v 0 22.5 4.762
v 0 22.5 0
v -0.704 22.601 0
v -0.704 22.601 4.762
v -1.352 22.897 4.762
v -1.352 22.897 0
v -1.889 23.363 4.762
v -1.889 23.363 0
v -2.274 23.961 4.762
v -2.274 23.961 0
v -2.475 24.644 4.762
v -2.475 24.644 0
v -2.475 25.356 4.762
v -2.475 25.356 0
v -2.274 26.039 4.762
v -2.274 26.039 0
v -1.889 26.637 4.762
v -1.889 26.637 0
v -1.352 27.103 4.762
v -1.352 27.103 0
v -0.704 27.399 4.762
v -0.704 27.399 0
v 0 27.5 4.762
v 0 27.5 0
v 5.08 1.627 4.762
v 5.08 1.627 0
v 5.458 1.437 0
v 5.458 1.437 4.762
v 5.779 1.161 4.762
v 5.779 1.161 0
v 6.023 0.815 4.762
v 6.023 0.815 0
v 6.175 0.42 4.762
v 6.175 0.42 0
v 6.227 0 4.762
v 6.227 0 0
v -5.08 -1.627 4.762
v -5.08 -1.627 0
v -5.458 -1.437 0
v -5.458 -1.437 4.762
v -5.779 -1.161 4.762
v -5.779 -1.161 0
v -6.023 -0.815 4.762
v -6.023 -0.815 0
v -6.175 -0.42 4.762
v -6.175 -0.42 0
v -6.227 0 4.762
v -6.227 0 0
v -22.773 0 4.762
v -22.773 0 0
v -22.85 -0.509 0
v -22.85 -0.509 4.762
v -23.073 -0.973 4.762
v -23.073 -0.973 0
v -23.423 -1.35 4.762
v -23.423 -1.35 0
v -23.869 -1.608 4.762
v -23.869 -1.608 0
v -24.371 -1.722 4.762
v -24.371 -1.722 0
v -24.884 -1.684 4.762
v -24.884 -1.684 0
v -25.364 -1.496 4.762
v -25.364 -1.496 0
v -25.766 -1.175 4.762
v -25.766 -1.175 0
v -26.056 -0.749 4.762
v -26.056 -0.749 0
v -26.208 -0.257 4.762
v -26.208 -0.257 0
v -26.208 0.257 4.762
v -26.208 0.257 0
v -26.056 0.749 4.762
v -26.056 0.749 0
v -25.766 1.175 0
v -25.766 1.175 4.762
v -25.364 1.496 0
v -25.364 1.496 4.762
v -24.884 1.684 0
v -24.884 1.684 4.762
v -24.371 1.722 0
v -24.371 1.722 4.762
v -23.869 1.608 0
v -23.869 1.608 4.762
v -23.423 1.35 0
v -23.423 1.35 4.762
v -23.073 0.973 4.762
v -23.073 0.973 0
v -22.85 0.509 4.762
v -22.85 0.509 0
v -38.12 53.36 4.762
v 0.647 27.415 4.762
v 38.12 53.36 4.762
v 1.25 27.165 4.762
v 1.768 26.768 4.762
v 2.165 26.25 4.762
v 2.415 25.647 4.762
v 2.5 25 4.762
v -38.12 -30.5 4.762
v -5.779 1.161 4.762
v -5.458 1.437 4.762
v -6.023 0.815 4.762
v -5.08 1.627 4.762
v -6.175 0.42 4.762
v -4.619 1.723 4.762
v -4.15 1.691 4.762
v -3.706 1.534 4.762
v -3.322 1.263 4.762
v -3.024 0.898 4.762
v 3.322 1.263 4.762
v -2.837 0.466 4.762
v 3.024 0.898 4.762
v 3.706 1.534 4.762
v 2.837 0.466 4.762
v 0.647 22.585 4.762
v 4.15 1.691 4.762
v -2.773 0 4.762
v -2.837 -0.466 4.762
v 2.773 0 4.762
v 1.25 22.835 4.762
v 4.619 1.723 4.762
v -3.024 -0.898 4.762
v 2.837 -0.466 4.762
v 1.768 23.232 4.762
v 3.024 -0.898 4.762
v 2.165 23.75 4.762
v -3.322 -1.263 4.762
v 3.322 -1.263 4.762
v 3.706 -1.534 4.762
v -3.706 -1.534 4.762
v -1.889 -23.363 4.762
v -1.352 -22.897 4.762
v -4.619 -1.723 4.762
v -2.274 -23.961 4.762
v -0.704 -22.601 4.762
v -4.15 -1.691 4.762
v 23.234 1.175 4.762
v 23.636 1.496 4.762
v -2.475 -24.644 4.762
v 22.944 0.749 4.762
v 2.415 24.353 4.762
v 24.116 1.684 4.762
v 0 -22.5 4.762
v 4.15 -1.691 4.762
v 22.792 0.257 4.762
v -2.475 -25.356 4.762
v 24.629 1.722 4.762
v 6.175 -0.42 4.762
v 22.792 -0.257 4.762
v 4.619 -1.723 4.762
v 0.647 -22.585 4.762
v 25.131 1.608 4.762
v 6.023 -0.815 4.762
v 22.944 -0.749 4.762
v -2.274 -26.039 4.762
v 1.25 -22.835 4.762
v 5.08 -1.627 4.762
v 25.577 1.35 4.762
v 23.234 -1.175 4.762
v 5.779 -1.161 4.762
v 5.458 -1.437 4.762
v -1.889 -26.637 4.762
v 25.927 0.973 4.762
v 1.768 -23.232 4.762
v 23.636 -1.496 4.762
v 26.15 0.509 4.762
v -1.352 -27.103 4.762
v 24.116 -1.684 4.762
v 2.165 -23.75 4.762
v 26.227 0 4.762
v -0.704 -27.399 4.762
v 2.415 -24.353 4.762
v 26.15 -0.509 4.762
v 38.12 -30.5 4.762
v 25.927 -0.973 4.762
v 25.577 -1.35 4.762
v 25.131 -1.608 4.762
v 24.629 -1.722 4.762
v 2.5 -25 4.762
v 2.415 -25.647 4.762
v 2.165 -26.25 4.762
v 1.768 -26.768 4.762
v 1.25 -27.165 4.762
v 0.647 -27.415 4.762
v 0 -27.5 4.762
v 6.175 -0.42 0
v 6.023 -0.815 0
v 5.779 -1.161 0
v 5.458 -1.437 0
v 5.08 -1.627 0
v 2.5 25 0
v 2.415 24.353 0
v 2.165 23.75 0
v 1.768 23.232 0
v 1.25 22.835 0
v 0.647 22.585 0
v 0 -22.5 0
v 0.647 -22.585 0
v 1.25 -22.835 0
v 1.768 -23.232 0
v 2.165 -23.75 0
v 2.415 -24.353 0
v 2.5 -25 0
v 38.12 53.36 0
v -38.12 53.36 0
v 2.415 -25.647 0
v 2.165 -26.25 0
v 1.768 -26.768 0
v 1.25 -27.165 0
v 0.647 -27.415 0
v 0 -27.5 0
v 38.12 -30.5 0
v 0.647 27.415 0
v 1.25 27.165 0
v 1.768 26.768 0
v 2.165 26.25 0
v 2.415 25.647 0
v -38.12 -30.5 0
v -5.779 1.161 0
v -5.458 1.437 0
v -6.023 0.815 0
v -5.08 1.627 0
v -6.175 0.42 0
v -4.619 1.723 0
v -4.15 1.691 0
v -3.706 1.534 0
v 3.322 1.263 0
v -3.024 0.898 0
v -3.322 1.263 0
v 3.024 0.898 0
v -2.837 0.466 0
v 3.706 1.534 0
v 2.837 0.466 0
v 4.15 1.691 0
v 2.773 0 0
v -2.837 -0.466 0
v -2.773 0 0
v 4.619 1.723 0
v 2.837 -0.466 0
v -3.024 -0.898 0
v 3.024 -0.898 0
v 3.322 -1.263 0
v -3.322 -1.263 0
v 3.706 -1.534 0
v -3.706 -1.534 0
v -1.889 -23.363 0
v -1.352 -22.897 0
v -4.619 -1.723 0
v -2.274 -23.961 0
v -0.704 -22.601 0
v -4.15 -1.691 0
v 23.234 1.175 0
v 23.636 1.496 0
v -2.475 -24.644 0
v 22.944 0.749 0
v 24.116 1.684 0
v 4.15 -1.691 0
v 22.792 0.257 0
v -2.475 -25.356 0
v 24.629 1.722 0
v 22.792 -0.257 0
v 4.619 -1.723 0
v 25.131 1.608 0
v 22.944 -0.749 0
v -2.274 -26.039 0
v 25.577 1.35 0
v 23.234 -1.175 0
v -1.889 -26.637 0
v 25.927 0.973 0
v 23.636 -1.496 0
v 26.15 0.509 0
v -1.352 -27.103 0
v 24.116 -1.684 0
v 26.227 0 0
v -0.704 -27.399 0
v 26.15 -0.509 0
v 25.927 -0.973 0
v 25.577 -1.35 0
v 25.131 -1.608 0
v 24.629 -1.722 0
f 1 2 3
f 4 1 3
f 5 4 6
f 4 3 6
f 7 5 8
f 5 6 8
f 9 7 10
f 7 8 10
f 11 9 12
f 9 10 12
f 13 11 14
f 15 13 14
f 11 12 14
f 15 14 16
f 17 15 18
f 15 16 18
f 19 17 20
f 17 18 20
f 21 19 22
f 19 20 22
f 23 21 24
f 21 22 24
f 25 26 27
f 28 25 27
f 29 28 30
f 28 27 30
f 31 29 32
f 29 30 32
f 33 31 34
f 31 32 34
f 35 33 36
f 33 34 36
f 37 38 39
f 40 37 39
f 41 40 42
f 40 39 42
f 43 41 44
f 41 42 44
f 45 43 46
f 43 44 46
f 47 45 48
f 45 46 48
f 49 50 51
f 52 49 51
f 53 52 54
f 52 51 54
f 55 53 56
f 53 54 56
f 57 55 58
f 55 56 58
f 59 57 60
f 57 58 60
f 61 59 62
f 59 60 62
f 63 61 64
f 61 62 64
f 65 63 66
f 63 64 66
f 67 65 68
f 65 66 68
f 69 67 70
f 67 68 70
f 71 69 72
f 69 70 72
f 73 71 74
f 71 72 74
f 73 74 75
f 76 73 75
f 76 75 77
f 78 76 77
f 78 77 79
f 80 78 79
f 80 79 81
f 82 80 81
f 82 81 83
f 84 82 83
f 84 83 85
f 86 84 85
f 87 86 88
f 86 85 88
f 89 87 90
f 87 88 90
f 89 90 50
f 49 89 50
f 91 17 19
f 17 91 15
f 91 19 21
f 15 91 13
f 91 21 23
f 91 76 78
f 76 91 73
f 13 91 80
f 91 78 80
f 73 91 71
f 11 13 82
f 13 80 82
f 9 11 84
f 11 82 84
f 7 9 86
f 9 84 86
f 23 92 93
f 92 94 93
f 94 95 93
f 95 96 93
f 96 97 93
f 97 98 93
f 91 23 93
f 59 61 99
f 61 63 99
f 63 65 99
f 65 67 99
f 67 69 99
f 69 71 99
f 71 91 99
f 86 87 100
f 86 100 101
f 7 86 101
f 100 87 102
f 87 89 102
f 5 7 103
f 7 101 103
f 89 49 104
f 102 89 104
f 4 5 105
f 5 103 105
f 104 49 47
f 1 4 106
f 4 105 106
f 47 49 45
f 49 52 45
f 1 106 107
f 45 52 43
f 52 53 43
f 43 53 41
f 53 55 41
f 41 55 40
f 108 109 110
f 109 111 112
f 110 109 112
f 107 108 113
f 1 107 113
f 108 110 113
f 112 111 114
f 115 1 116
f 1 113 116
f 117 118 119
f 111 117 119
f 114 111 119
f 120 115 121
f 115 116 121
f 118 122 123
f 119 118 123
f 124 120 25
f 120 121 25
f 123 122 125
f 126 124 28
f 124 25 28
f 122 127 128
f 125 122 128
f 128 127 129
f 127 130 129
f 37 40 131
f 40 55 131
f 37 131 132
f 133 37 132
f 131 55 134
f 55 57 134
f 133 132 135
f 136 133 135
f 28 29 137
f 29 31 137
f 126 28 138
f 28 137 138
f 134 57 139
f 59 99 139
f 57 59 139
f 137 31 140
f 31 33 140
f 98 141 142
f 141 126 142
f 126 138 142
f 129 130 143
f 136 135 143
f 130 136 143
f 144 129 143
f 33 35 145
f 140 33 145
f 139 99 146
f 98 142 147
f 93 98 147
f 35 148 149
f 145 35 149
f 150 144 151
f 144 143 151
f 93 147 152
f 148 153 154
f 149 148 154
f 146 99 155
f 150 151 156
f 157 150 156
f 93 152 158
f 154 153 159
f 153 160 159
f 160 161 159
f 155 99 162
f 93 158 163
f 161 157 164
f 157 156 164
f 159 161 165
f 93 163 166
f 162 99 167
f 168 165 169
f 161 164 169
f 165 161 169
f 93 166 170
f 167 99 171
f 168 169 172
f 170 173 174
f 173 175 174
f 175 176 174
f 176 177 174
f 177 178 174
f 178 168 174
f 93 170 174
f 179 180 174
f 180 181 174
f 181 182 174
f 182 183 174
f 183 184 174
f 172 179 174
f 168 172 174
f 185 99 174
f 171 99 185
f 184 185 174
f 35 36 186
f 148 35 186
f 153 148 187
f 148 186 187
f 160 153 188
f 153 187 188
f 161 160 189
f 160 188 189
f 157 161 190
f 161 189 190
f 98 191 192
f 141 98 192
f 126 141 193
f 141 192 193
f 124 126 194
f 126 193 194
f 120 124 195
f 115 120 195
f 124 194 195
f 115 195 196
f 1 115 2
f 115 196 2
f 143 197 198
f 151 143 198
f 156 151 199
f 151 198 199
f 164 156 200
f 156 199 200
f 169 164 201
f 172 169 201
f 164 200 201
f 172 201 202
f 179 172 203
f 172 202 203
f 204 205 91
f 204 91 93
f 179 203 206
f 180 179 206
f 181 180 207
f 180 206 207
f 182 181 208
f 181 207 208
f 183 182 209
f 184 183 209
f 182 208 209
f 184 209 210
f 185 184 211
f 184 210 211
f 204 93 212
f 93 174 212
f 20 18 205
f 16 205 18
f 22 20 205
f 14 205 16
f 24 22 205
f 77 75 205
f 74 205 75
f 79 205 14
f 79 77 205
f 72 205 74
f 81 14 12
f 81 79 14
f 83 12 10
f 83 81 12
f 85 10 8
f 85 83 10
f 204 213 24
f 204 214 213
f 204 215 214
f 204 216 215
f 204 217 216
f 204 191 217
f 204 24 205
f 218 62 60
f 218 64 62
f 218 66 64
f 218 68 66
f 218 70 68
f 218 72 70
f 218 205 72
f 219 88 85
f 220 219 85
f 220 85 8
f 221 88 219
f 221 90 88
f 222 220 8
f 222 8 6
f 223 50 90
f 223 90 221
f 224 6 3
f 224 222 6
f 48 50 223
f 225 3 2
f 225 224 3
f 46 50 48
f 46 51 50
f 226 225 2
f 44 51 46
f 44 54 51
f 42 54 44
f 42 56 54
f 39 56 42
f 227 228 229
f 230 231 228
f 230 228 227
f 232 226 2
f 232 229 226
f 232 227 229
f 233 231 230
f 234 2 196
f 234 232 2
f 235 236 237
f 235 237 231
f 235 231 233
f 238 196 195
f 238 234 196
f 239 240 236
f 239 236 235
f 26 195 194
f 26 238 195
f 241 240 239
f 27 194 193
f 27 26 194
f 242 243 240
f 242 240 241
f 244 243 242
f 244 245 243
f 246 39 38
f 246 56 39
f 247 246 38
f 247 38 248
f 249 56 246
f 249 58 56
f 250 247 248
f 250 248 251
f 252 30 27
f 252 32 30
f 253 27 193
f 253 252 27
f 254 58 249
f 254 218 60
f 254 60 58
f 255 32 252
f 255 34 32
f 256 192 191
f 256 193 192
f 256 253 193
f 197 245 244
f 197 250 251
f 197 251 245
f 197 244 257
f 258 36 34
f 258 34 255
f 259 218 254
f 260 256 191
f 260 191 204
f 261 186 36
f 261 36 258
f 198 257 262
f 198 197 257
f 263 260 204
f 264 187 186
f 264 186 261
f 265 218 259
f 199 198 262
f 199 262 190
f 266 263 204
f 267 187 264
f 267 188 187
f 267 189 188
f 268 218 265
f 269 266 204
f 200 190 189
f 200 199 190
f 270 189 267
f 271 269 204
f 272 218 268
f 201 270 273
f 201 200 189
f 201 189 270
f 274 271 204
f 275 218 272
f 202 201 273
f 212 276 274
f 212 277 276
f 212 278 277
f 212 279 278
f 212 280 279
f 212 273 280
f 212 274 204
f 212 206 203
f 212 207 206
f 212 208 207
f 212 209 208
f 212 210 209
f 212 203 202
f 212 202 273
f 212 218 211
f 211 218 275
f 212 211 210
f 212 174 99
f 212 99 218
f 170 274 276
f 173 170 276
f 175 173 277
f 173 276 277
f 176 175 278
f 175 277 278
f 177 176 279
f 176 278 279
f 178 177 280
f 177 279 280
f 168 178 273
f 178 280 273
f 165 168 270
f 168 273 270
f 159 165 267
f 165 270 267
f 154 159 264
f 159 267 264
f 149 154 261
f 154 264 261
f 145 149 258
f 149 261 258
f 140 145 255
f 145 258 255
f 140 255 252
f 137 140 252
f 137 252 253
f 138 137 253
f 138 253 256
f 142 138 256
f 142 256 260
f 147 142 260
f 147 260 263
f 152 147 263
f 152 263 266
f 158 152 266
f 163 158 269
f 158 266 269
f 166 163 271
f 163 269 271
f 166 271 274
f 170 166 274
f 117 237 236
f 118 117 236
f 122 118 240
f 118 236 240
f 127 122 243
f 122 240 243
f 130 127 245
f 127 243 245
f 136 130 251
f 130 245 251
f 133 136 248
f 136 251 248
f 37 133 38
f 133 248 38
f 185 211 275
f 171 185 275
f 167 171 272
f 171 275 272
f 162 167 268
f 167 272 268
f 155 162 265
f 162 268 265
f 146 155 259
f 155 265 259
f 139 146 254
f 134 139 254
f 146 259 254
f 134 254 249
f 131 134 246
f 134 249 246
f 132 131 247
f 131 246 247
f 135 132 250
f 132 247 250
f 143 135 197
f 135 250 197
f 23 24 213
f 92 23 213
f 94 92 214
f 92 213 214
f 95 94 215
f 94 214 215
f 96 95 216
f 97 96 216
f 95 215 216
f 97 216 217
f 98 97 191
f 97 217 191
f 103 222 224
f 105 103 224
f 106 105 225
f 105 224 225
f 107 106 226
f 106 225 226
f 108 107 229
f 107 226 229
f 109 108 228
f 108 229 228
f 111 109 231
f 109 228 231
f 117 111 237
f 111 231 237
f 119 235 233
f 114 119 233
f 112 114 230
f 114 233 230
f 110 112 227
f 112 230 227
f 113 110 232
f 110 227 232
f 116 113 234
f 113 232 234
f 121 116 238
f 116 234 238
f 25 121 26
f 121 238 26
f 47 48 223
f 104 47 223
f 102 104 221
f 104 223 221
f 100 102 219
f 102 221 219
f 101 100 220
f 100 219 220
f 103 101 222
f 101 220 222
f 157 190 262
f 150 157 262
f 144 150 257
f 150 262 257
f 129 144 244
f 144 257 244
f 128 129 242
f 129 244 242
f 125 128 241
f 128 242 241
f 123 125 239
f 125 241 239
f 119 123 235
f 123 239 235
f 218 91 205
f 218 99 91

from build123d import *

# Parameters (mm, degrees)
SKETCH1_W           = 25.42
SKETCH1_H           = 25.42
BOSS_EXTRUDE5_DEPTH = 4.7625
SKETCH3_W           = 4.7625
SKETCH3_H           = 61
BOSS_EXTRUDE6_DEPTH = 7.62
SKETCH4_W           = 4.7625
SKETCH4_H           = 61
BOSS_EXTRUDE7_DEPTH = 7.62
SKETCH5_W           = 76.24
SKETCH5_H           = 4.7625
BOSS_EXTRUDE8_DEPTH = 22.86


with BuildPart() as part:
    # Sketch1 → Boss-Extrude5 (new body)
    with BuildSketch(Plane.XY):
        with BuildLine():
            Line((0, 27.5), (0, 30.5))
            Line((0, 30.5), (-5.08, 30.5))
            Line((-5.08, 30.5), (-5.08, 5.08))
            Line((-5.08, 5.08), (0, 5.08))
            Line((0, 5.08), (0, 22.5))
            ThreePointArc((0, 22.5), (-2.5, 25), (0, 27.5))
        make_face()
        with BuildLine():
            Line((5.08, 30.5), (0, 30.5))
            Line((0, 30.5), (0, 27.5))
            ThreePointArc((0, 27.5), (1.767766953, 26.767766953), (2.5, 25))
            ThreePointArc((2.5, 25), (1.767766953, 23.232233047), (0, 22.5))
            Line((0, 22.5), (0, 5.08))
            Line((0, 5.08), (5.08, 5.08))
            Line((5.08, 5.08), (5.08, 30.5))
        make_face()
        with BuildLine():
            Line((30.5, 5.08), (5.08, 5.08))
            Line((5.08, 5.08), (5.08, 1.626904988))
            ThreePointArc((5.08, 1.626904988), (5.911558685, 0.995350149), (6.2272, 0))
            Line((6.2272, 0), (22.7728, 0))
            ThreePointArc((22.7728, 0), (24.5, 1.7272), (26.2272, 0))
            Line((26.2272, 0), (30.5, 0))
            Line((30.5, 0), (30.5, 5.08))
        make_face()
        with BuildLine():
            Line((22.7728, 0), (6.2272, 0))
            ThreePointArc((6.2272, 0), (5.911558685, -0.995350149), (5.08, -1.626904988))
            Line((5.08, -1.626904988), (5.08, -5.08))
            Line((5.08, -5.08), (30.5, -5.08))
            Line((30.5, -5.08), (30.5, 0))
            Line((30.5, 0), (26.2272, 0))
            ThreePointArc((26.2272, 0), (24.5, -1.7272), (22.7728, 0))
        make_face()
        with BuildLine():
            Line((2.7728, 0), (0, 0))
            Line((0, 0), (0, -5.08))
            Line((0, -5.08), (5.08, -5.08))
            Line((5.08, -5.08), (5.08, -1.626904988))
            ThreePointArc((5.08, -1.626904988), (3.504649851, -1.411558685), (2.7728, 0))
        make_face()
        with BuildLine():
            Line((0, -5.08), (0, 0))
            Line((0, 0), (-2.7728, 0))
            ThreePointArc((-2.7728, 0), (-3.504649851, -1.411558685), (-5.08, -1.626904988))
            Line((-5.08, -1.626904988), (-5.08, -5.08))
            Line((-5.08, -5.08), (0, -5.08))
        make_face()
        with BuildLine():
            Line((5.08, 1.626904988), (5.08, 5.08))
            Line((5.08, 5.08), (0, 5.08))
            Line((0, 5.08), (0, 0))
            Line((0, 0), (2.7728, 0))
            ThreePointArc((2.7728, 0), (3.504649851, 1.411558685), (5.08, 1.626904988))
        make_face()
        with BuildLine():
            Line((0, 5.08), (-5.08, 5.08))
            Line((-5.08, 5.08), (-5.08, 1.626904988))
            ThreePointArc((-5.08, 1.626904988), (-3.504649851, 1.411558685), (-2.7728, 0))
            Line((-2.7728, 0), (0, 0))
            Line((0, 0), (0, 5.08))
        make_face()
        with BuildLine():
            Line((-5.08, 1.626904988), (-5.08, 5.08))
            Line((-5.08, 5.08), (-30.5, 5.08))
            Line((-30.5, 5.08), (-30.5, 0))
            Line((-30.5, 0), (-26.2272, 0))
            ThreePointArc((-26.2272, 0), (-24.5, 1.7272), (-22.7728, 0))
            Line((-22.7728, 0), (-6.2272, 0))
            ThreePointArc((-6.2272, 0), (-5.911558685, 0.995350149), (-5.08, 1.626904988))
        make_face()
        with BuildLine():
            ThreePointArc((-5.08, -1.626904988), (-5.911558685, -0.995350149), (-6.2272, 0))
            Line((-6.2272, 0), (-22.7728, 0))
            ThreePointArc((-22.7728, 0), (-24.5, -1.7272), (-26.2272, 0))
            Line((-26.2272, 0), (-30.5, 0))
            Line((-30.5, 0), (-30.5, -5.08))
            Line((-30.5, -5.08), (-5.08, -5.08))
            Line((-5.08, -5.08), (-5.08, -1.626904988))
        make_face()
        with BuildLine():
            Line((0, -22.5), (0, -5.08))
            Line((0, -5.08), (-5.08, -5.08))
            Line((-5.08, -5.08), (-5.08, -30.5))
            Line((-5.08, -30.5), (0, -30.5))
            Line((0, -30.5), (0, -27.5))
            ThreePointArc((0, -27.5), (-2.5, -25), (0, -22.5))
        make_face()
        with BuildLine():
            Line((5.08, -5.08), (0, -5.08))
            Line((0, -5.08), (0, -22.5))
            ThreePointArc((0, -22.5), (1.767766953, -23.232233047), (2.5, -25))
            ThreePointArc((2.5, -25), (1.767766953, -26.767766953), (0, -27.5))
            Line((0, -27.5), (0, -30.5))
            Line((0, -30.5), (5.08, -30.5))
            Line((5.08, -30.5), (5.08, -5.08))
        make_face()
        with Locations((-17.79, 17.79)):
            Rectangle(SKETCH1_W, SKETCH1_H)
        with Locations((17.79, 17.79)):
            Rectangle(SKETCH1_W, SKETCH1_H)
        with Locations((17.79, -17.79)):
            Rectangle(SKETCH1_W, SKETCH1_H)
        with Locations((-17.79, -17.79)):
            Rectangle(SKETCH1_W, SKETCH1_H)
    extrude(amount=BOSS_EXTRUDE5_DEPTH)

    # Sketch3 → Boss-Extrude6 (add)
    with BuildSketch(Plane.ZY.offset(30.5)):
        with Locations((2.38125, 0)):
            Rectangle(SKETCH3_W, SKETCH3_H)
    extrude(amount=BOSS_EXTRUDE6_DEPTH)

    # Sketch4 → Boss-Extrude7 (add)
    with BuildSketch(Plane(origin=(30.5, 0, 0), x_dir=(0, 0, -1), z_dir=(1, 0, 0))):
        with Locations((-2.38125, 0)):
            Rectangle(SKETCH4_W, SKETCH4_H)
    extrude(amount=BOSS_EXTRUDE7_DEPTH)

    # Sketch5 → Boss-Extrude8 (add)
    with BuildSketch(Plane(origin=(0, 30.5, 0), x_dir=(1, 0, 0), z_dir=(0, 1, 0))):
        with Locations((0, -2.38125)):
            Rectangle(SKETCH5_W, SKETCH5_H)
    extrude(amount=BOSS_EXTRUDE8_DEPTH)


solid = part.part
